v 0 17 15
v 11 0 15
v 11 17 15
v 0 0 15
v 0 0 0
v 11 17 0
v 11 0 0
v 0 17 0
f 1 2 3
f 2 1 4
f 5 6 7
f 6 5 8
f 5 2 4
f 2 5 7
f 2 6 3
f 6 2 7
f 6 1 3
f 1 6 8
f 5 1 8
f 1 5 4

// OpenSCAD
// Generated by SolidPython 1.0.1 on 2020-07-29 00:46:55


cube(size = [11, 17, 15]);
/***********************************************
*********      SolidPython code:      **********
************************************************
 
# import packages: SolidPython
from solid import *
from solid.utils import *
from itertools import chain, combinations, permutations


class Resize:

    def __init__(self, scad_file):
        self.scad_file = scad_file
        #self.scad_file = import_scad(scad_file)
        # cone/cylinder param:
        self.r1 = 0
        self.r2 = 0
        self.h = 0
        # rectangular prism param:
        self.w = 0
        self.l = 0
        # ellipse param:
        self.r = 0

    # import OpenScad code (file name corresponds to shape)


    # classify shape + parameters
    def assign(self, param1, param2, param3):
        if self.scad_file == 'cone.scad':
            self.r1 = param1
            self.r2 = param2
            self.h = param3
        elif self.scad_file == 'cylinder.scad':
            self.r1 = param1
            self.r2 = param2
            self.h = param3
        elif self.scad_file == 'rectangularPrism.scad':
            self.h = param1
            self.l = param2
            self.w = param3
        else:
            self.r = param1
            self.h = param2

    # resize parameters
    def iterate(self):
        x = range(3, 20, 2)
        i = 1
        if self.scad_file == 'cone.scad':
            tempList = list(permutations(x, 2))
            for temp in tempList:
                param1 = temp[0]
                param2 = temp[1]
                filepath = 'produced_scad_files/' + 'cone' + str(param1) + '_' + str(param2) + '_' + '.scad'
                scad_render_to_file(cylinder(h=param1, r1=param2, r2=0), filepath)

        elif self.scad_file == 'cylinder.scad':
            tempList = list(permutations(x, 3))
            for temp in tempList:
                param1 = temp[0]
                param2 = temp[1]
                filepath = 'produced_scad_files/' + 'cylinder' + str(param1) + '_' + str(param2) + '_' + '.scad'
                scad_render_to_file(cylinder(h=param1, r1=param2, r2=param2), filepath)

        elif self.scad_file == 'rectangularPrism.scad':
            tempList = list(permutations(x, 3))
            for temp in tempList:
                param1 = temp[0]
                param2 = temp[1]
                param3 = temp[2]
                filepath = 'produced_scad_files/' + 'rectangularPrism' + str(param1) + '_' + str(param2) + '_' + str(
                    param3) + '.scad'
                scad_render_to_file(cube(size=(param1, param2, param3)), filepath)

        elif self.scad_file == 'ellipse.scad':
            tempList = list(permutations(x, 4))
            for temp in tempList:
                param1 = temp[0]
                param2 = temp[1]
                param3 = temp[2]
                param4 = temp[3]
                filepath = 'produced_scad_files/' + 'ellipse' + str(param1) + '_' + str(param2) + '_' + str(param3) + '_' + str(param4) + '.scad'
                scad_render_to_file(scale([param1, param2, param3])(sphere(r=param4)), filepath)

    def render_to_scadfile(self):
        scad_render_to_file(scad, 'example.scad') 
 
************************************************/
